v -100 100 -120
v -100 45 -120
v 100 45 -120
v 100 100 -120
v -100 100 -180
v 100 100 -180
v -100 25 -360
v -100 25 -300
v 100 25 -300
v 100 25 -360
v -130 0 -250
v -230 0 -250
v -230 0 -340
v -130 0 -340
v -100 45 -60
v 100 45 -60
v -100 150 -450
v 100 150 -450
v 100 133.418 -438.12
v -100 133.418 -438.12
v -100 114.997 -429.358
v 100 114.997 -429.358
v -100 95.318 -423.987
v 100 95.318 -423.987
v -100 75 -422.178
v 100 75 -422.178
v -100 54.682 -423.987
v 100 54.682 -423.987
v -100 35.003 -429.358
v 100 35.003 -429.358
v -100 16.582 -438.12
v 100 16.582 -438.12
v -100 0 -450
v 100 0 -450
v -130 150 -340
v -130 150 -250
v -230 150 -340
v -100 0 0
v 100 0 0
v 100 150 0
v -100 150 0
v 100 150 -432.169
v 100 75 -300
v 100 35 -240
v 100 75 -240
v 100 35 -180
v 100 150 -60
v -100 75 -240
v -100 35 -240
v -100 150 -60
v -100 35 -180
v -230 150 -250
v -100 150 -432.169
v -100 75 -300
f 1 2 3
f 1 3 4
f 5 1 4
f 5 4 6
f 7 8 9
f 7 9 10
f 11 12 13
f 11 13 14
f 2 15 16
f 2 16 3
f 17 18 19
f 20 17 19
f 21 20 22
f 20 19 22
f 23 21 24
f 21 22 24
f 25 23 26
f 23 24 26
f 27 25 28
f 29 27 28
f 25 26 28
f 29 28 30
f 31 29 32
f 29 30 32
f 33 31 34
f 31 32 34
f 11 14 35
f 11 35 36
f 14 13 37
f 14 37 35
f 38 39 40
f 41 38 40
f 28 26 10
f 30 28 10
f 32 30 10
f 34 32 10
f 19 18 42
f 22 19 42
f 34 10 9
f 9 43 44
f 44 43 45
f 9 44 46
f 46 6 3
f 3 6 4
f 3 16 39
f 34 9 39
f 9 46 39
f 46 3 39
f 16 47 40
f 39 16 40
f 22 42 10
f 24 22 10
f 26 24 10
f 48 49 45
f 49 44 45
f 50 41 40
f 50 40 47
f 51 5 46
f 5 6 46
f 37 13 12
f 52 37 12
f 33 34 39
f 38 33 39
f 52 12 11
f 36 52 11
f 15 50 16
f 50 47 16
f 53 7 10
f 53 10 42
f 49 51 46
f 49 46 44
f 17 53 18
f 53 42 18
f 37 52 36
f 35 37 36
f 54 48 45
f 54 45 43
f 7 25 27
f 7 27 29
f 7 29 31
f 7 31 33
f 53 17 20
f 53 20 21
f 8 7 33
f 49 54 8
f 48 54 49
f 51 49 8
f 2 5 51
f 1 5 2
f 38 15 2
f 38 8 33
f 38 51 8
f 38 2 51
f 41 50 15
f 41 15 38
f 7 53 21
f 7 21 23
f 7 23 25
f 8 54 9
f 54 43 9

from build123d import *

# Parameters (mm, degrees)
BOSS_EXTRUDE1_DEPTH = 100
SKETCH2_W           = 100
SKETCH2_H           = 90
BOSS_EXTRUDE2_DEPTH = 150


with BuildPart() as part:
    # Sketch1 → Boss-Extrude1 (new, symmetric)
    with BuildSketch(Plane(origin=(0, 0, 0), x_dir=(0, 0, -1), z_dir=(1, 0, 0))):
        with BuildLine():
            Line((0, 0), (0, 150))
            Line((0, 150), (60, 150))
            Line((60, 150), (60, 45))
            Line((60, 45), (120, 45))
            Line((120, 45), (120, 100))
            Line((120, 100), (180, 100))
            Line((180, 100), (180, 35))
            Line((180, 35), (240, 35))
            Line((240, 35), (240, 75))
            Line((240, 75), (300, 75))
            Line((300, 75), (300, 25))
            Line((300, 25), (360, 25))
            Line((360, 25), (432.168783649, 150))
            Line((432.168783649, 150), (450, 150))
            ThreePointArc((450, 150), (422.177978871, 75), (450, 0))
            Line((450, 0), (0, 0))
        make_face()
    extrude(amount=BOSS_EXTRUDE1_DEPTH, both=True)


with BuildPart() as body_2:
    # Sketch2 → Boss-Extrude2 (new body)
    with BuildSketch(Plane.XZ):
        with Locations((-180, -295)):
            Rectangle(SKETCH2_W, SKETCH2_H)
    extrude(amount=-BOSS_EXTRUDE2_DEPTH)


solid = Compound([part.part, body_2.part])
